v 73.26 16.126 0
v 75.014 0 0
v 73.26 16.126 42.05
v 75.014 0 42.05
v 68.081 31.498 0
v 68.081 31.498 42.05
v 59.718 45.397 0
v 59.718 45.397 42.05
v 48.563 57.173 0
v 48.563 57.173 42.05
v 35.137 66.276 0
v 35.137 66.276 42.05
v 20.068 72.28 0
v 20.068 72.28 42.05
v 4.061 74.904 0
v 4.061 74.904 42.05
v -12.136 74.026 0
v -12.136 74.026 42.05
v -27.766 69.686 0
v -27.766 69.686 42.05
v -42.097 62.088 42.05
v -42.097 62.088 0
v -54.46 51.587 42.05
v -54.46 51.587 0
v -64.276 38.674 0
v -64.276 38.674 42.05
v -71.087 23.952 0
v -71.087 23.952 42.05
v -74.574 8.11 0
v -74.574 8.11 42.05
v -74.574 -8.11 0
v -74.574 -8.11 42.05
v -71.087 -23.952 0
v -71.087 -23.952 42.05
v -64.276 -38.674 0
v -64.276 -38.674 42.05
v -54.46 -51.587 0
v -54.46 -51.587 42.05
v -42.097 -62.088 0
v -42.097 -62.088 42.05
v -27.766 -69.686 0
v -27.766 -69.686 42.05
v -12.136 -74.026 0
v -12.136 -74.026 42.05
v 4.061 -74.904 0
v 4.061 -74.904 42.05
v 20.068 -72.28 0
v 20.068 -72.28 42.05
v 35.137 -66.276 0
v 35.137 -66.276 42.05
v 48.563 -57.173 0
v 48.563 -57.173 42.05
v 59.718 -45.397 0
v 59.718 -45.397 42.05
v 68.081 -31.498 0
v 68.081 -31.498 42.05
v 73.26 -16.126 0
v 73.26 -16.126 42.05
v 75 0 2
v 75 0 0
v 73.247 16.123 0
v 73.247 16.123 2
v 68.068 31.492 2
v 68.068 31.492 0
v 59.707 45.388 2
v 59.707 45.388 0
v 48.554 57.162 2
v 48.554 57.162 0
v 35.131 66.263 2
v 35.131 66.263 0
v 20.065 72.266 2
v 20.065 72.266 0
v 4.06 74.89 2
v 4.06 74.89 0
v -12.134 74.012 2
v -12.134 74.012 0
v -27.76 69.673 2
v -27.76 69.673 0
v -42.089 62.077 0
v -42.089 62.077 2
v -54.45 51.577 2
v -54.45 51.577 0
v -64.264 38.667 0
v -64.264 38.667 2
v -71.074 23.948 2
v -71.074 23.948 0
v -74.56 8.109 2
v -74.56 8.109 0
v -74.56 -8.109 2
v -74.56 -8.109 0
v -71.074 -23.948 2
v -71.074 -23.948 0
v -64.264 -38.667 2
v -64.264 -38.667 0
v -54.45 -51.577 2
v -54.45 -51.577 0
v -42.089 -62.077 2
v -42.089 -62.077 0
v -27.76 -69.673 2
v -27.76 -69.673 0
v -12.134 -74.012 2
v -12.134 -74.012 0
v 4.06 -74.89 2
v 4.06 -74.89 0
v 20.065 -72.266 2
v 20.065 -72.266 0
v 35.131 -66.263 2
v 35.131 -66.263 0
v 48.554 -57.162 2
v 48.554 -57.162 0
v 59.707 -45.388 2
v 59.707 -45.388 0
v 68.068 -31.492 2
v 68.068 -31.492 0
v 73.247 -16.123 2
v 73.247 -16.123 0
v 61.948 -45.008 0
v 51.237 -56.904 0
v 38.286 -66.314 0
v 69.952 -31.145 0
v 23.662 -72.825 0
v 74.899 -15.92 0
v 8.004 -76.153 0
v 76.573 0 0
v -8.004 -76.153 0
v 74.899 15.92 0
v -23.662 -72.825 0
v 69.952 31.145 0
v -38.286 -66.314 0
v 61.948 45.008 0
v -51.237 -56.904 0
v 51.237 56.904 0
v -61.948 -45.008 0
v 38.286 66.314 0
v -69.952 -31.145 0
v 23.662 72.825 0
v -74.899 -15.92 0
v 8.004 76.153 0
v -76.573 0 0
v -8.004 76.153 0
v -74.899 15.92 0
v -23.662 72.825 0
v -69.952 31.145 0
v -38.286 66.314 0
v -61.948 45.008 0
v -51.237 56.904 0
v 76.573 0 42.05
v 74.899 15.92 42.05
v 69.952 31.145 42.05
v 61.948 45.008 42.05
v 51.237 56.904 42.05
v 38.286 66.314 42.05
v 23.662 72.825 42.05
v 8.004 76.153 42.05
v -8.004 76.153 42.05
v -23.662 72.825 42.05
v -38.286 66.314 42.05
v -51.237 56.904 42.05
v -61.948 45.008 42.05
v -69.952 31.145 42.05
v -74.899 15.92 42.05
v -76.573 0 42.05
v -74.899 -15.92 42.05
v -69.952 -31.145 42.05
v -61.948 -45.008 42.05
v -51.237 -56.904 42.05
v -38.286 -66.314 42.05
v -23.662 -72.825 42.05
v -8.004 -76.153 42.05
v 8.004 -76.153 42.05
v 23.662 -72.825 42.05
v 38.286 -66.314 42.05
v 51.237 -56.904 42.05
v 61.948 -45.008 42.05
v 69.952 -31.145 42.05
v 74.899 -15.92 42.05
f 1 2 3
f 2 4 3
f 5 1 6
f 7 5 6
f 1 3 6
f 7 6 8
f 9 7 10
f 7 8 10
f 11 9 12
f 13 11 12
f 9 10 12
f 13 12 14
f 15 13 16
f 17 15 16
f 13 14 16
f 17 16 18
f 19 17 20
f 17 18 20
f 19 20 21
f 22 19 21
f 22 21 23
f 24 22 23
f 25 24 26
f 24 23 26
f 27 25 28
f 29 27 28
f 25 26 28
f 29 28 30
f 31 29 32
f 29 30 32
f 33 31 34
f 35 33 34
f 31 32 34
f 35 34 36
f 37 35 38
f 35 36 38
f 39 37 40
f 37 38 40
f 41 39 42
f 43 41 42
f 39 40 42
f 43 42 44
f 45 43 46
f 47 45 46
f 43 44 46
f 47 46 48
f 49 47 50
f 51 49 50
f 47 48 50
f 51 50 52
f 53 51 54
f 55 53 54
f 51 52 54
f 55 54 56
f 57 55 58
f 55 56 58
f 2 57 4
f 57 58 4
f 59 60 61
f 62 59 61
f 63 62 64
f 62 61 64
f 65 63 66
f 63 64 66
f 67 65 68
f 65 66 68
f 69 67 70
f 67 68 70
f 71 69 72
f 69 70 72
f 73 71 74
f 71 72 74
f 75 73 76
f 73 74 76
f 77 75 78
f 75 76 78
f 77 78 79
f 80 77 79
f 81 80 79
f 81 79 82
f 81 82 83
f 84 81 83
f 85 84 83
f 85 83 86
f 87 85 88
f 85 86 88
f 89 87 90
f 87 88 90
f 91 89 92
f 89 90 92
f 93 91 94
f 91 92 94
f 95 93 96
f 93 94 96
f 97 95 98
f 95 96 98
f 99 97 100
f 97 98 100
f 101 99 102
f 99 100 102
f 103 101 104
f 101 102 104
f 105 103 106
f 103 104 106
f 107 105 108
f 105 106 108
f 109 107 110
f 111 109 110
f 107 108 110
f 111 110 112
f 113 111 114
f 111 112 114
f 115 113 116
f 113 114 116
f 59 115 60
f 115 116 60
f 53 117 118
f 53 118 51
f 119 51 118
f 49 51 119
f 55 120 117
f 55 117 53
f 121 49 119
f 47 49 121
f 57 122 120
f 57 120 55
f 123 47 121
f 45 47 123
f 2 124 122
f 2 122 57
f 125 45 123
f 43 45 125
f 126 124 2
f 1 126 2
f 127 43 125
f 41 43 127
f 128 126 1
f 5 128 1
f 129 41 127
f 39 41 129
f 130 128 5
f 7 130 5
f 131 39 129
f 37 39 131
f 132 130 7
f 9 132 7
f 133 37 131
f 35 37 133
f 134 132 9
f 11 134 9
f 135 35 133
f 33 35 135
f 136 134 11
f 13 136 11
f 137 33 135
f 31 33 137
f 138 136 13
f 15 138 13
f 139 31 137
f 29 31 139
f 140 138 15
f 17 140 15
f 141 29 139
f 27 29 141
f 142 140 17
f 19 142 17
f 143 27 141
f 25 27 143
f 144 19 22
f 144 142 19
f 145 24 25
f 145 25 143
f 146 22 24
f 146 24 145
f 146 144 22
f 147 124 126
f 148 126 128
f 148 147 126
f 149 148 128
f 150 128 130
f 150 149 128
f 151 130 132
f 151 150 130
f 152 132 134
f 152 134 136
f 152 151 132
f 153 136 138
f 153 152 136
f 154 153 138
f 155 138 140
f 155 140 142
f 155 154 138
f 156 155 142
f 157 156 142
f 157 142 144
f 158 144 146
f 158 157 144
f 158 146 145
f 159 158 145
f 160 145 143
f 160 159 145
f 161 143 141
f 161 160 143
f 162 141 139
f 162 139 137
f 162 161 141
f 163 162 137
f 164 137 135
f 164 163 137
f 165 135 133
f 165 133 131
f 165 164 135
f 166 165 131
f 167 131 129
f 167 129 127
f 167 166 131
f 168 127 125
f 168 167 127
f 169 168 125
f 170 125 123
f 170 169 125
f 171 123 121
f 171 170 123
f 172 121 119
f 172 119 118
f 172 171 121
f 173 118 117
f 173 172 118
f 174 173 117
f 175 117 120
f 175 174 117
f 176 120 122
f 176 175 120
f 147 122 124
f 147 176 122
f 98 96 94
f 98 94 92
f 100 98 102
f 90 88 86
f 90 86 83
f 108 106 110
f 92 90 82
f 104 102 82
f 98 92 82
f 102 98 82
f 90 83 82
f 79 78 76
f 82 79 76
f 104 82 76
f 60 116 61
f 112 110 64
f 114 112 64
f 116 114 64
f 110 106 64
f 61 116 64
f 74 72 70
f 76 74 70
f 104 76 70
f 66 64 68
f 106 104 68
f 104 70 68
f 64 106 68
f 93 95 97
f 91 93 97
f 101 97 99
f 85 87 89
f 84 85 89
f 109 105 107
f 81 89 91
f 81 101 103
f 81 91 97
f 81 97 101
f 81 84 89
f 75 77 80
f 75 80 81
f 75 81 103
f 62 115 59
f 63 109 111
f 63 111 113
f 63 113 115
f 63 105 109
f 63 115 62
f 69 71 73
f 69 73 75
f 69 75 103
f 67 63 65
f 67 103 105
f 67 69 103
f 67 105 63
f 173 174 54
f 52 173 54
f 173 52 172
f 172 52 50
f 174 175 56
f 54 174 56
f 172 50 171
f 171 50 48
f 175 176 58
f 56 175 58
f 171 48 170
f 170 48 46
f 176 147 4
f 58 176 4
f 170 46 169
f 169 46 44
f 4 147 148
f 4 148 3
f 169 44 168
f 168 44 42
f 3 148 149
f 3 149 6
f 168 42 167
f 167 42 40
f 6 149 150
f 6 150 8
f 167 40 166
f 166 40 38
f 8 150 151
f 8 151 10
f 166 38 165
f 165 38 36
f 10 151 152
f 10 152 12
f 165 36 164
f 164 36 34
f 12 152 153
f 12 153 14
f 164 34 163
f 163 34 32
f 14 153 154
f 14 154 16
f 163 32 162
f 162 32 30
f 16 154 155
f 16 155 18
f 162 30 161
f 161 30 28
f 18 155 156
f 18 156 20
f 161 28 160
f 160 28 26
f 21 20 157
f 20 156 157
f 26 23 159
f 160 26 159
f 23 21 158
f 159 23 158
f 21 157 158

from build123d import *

# Parameters (mm, degrees)
F0_R     = 75
F1_DEPTH = 2
F2_W     = 1.5584379435
F2_H     = 42.0504882932


# Not quite as in the source:
# - a feature names something its author has since deleted; it is built from what else it names


with BuildPart() as f1:
    # F0 (on Top) → F1 (new body)
    with BuildSketch(Plane.XY):
        Circle(F0_R)
    extrude(amount=F1_DEPTH)


with BuildPart() as f3:
    # F2 (on Front) → F3 (revolve)
    with BuildSketch(Plane.XZ):
        with Locations((75.7932811975, 21.0252441466)):
            Rectangle(F2_W, F2_H)
    revolve(axis=Axis((0, 0, 2), (0, 0, 1)))


solid = Compound([f1.part, f3.part])
